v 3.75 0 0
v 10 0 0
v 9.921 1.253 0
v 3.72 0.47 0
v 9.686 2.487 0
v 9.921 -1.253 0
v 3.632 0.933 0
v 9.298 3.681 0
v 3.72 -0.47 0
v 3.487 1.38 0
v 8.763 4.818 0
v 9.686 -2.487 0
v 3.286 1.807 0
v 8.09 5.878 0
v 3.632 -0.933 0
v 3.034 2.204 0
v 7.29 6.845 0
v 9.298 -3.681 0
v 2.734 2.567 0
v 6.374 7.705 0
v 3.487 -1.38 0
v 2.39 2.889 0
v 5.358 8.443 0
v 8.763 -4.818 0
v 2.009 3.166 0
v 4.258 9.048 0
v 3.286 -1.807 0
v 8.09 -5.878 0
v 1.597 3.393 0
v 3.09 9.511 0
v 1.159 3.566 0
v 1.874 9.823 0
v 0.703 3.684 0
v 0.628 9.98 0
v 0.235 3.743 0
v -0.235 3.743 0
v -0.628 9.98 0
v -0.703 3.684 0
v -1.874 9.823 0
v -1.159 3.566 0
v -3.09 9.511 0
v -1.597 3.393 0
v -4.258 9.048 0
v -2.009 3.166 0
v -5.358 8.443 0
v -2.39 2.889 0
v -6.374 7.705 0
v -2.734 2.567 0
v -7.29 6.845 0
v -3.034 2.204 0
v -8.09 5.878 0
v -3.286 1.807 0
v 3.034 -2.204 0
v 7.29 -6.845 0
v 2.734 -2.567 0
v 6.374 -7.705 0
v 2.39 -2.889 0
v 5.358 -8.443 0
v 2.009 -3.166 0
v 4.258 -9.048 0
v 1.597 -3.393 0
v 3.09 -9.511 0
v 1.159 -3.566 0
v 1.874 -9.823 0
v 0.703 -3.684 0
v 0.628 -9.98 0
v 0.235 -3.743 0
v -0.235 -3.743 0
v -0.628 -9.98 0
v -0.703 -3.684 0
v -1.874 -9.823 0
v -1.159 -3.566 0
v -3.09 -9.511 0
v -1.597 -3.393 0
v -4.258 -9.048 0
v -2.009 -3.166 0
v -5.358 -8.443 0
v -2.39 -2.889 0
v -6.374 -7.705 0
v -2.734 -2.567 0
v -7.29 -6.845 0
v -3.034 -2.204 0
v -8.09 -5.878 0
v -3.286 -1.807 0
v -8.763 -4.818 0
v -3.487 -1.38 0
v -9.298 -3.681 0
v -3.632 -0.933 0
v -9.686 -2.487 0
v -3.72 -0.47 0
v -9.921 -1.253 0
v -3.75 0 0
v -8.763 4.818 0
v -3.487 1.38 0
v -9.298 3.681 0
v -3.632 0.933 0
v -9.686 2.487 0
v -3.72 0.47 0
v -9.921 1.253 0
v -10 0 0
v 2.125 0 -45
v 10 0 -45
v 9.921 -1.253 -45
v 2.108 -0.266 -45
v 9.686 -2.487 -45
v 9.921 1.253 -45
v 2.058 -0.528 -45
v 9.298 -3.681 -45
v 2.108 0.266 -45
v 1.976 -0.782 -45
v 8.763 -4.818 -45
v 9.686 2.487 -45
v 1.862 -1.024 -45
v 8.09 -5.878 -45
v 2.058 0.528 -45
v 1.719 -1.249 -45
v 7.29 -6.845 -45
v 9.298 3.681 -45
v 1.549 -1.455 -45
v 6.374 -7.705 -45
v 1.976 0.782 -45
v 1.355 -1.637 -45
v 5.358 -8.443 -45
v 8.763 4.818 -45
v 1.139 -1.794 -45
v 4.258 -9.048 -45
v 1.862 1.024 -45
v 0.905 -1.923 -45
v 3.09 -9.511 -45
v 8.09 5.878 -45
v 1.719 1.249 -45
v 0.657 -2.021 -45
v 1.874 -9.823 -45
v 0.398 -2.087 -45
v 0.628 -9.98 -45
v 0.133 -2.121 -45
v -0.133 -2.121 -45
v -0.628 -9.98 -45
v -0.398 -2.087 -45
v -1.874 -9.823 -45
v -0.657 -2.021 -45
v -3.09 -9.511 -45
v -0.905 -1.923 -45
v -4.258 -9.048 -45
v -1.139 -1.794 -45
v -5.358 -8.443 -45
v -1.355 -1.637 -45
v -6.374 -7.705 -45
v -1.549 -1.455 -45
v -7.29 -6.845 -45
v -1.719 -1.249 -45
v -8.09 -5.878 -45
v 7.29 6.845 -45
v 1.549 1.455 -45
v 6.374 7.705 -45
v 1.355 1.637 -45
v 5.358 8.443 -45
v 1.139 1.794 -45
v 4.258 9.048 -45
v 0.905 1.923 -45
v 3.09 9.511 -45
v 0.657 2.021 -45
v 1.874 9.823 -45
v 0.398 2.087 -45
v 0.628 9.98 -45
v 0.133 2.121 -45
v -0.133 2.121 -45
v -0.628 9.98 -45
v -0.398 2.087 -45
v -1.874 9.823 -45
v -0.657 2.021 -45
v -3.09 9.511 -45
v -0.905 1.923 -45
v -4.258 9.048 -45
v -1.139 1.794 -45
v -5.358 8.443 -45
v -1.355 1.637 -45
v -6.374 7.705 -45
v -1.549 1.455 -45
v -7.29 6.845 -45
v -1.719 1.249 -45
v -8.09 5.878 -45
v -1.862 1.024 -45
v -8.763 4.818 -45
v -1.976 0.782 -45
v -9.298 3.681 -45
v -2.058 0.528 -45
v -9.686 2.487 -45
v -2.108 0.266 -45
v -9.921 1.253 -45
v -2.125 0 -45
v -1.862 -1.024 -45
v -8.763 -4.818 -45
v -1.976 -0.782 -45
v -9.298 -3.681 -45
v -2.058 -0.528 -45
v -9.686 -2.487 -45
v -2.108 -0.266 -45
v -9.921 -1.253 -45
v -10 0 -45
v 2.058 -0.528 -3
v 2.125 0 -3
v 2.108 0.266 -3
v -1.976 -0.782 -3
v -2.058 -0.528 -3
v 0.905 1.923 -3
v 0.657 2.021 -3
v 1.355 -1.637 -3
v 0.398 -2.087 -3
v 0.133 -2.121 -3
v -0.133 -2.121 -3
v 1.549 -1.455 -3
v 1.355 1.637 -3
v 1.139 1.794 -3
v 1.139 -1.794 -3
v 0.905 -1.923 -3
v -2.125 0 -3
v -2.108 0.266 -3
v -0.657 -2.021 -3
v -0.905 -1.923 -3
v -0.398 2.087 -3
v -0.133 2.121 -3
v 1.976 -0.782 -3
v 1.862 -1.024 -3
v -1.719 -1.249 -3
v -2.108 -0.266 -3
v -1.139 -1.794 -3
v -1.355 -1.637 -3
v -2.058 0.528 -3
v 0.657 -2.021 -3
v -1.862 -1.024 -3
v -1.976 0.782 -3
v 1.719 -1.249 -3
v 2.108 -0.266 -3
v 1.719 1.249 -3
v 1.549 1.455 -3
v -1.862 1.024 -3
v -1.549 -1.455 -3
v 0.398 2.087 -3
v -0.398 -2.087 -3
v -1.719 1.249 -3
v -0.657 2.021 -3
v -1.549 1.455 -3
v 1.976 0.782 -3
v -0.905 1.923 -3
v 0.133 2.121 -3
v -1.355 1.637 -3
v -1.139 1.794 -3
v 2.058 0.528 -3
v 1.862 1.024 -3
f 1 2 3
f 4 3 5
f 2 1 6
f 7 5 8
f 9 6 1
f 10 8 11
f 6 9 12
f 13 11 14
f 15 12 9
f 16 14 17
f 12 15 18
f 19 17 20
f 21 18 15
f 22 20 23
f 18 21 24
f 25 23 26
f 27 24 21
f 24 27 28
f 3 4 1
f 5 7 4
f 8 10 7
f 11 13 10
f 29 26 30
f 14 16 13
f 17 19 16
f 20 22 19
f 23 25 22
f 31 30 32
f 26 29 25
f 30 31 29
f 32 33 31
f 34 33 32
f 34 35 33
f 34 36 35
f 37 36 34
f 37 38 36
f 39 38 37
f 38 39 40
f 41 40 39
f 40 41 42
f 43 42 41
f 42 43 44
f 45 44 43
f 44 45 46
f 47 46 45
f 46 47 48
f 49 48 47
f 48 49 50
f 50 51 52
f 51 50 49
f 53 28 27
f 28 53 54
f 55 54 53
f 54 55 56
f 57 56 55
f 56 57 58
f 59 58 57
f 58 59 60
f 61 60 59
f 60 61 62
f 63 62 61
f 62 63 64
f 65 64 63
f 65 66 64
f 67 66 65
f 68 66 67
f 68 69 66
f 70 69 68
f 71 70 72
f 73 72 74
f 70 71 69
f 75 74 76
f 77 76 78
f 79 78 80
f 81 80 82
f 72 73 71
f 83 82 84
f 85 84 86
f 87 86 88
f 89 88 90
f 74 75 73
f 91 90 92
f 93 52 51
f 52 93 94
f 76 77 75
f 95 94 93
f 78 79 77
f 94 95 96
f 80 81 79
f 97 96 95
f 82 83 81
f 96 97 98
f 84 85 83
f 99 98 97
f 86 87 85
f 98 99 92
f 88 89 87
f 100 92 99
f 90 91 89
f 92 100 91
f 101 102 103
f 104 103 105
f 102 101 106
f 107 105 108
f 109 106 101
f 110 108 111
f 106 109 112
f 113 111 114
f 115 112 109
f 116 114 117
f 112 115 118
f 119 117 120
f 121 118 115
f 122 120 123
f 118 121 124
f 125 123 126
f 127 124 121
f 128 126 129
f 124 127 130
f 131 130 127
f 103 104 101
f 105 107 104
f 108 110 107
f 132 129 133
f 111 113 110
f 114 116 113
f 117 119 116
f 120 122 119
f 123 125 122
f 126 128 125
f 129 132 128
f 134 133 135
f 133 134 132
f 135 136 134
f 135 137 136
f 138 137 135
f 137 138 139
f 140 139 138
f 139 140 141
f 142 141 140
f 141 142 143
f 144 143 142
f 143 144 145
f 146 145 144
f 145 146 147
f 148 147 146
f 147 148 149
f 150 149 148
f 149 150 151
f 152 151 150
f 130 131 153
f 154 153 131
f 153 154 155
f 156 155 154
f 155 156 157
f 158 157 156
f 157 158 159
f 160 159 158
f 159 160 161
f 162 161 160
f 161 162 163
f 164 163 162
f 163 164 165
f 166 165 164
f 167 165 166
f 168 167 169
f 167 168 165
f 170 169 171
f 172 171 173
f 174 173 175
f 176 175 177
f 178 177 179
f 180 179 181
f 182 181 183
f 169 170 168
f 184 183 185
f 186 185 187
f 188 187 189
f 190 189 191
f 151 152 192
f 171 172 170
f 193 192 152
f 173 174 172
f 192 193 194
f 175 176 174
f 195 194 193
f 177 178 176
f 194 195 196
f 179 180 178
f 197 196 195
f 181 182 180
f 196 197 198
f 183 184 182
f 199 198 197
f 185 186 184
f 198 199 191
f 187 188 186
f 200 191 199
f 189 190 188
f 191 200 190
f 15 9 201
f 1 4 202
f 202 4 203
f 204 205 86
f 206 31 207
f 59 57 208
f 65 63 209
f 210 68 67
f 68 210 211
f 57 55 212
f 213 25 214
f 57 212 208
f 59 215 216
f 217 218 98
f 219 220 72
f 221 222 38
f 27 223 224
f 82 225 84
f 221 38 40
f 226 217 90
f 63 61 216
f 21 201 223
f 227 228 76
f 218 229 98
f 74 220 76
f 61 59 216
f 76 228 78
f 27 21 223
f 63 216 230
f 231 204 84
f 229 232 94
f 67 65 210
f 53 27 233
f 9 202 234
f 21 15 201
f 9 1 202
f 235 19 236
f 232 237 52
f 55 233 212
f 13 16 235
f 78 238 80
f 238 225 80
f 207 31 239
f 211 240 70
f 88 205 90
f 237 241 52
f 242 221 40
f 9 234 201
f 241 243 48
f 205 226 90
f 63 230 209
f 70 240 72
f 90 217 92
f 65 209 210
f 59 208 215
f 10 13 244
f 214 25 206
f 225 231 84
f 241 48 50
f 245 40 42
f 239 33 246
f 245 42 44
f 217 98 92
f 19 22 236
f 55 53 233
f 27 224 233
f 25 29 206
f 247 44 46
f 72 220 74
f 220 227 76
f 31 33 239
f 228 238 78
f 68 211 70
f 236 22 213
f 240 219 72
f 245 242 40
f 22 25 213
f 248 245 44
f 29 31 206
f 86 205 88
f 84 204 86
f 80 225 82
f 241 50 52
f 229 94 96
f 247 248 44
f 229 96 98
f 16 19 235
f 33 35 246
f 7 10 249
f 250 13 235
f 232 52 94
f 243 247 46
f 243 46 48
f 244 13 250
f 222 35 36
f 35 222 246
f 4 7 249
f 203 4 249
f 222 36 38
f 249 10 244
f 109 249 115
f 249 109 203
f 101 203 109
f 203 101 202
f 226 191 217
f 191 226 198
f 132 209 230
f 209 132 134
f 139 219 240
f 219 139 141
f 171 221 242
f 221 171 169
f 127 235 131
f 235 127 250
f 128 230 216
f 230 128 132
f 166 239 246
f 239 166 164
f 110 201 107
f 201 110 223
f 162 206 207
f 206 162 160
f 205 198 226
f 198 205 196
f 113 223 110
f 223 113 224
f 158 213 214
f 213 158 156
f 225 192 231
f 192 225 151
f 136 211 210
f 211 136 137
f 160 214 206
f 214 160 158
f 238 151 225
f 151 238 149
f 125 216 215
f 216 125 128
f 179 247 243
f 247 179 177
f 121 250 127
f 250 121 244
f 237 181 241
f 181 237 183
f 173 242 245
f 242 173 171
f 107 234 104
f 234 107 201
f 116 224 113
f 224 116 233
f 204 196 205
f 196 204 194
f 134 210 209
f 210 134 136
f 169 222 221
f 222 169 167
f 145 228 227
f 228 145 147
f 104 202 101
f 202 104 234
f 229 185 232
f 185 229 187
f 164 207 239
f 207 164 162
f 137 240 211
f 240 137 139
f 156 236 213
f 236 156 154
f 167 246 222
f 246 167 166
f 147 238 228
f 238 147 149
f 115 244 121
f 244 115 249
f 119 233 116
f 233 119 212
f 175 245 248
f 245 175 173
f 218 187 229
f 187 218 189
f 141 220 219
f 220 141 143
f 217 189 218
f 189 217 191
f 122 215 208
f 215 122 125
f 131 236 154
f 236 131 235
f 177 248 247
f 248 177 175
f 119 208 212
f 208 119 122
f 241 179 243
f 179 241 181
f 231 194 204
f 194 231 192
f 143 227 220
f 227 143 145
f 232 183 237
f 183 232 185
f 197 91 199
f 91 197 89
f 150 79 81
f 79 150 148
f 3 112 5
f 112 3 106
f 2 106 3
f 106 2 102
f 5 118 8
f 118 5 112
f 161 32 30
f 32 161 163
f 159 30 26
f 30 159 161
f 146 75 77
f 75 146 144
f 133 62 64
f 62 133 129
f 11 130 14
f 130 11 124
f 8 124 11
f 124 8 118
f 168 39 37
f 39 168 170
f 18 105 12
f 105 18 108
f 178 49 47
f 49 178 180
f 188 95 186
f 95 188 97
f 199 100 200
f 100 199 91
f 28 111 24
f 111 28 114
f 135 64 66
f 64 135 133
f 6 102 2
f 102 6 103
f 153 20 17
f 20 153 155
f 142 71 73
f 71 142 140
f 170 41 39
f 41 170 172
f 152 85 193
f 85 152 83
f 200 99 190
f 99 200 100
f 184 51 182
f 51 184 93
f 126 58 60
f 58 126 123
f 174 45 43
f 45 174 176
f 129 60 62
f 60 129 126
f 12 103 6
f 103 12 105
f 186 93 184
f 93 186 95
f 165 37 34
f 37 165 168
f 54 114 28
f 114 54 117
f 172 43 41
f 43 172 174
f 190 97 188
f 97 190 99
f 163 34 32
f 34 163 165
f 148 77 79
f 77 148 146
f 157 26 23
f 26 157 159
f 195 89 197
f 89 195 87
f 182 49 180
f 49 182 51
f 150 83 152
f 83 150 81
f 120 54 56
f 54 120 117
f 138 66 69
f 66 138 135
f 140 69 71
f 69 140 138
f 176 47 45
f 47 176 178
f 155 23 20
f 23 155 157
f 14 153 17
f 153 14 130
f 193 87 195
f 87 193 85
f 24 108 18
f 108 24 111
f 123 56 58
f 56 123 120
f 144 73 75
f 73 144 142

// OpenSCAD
$fn = 50;


difference() {
	union() {
		translate(v = [0, 0, -45.0000000000]) {
			cylinder(h = 45, r = 10.0000000000);
		}
		cylinder(h = 0, r = 20.0000000000);
	}
	union() {
		translate(v = [0, 0, 0]) {
			rotate(a = [0, 0, 0]) {
				difference() {
					union() {
						#translate(v = [0, 0, -45.0000000000]) {
							cylinder(h = 45, r = 2.0000000000);
						}
						#translate(v = [0, 0, -3]) {
							cylinder(h = 3, r = 10.0000000000, r1 = 2.1250000000, r2 = 3.7500000000);
						}
						#translate(v = [0, 0, -45.0000000000]) {
							cylinder(h = 45, r = 2.1250000000);
						}
						#translate(v = [0, 0, -45.0000000000]) {
							cylinder(h = 45, r = 2.0000000000);
						}
					}
					union();
				}
			}
		}
	}
}
